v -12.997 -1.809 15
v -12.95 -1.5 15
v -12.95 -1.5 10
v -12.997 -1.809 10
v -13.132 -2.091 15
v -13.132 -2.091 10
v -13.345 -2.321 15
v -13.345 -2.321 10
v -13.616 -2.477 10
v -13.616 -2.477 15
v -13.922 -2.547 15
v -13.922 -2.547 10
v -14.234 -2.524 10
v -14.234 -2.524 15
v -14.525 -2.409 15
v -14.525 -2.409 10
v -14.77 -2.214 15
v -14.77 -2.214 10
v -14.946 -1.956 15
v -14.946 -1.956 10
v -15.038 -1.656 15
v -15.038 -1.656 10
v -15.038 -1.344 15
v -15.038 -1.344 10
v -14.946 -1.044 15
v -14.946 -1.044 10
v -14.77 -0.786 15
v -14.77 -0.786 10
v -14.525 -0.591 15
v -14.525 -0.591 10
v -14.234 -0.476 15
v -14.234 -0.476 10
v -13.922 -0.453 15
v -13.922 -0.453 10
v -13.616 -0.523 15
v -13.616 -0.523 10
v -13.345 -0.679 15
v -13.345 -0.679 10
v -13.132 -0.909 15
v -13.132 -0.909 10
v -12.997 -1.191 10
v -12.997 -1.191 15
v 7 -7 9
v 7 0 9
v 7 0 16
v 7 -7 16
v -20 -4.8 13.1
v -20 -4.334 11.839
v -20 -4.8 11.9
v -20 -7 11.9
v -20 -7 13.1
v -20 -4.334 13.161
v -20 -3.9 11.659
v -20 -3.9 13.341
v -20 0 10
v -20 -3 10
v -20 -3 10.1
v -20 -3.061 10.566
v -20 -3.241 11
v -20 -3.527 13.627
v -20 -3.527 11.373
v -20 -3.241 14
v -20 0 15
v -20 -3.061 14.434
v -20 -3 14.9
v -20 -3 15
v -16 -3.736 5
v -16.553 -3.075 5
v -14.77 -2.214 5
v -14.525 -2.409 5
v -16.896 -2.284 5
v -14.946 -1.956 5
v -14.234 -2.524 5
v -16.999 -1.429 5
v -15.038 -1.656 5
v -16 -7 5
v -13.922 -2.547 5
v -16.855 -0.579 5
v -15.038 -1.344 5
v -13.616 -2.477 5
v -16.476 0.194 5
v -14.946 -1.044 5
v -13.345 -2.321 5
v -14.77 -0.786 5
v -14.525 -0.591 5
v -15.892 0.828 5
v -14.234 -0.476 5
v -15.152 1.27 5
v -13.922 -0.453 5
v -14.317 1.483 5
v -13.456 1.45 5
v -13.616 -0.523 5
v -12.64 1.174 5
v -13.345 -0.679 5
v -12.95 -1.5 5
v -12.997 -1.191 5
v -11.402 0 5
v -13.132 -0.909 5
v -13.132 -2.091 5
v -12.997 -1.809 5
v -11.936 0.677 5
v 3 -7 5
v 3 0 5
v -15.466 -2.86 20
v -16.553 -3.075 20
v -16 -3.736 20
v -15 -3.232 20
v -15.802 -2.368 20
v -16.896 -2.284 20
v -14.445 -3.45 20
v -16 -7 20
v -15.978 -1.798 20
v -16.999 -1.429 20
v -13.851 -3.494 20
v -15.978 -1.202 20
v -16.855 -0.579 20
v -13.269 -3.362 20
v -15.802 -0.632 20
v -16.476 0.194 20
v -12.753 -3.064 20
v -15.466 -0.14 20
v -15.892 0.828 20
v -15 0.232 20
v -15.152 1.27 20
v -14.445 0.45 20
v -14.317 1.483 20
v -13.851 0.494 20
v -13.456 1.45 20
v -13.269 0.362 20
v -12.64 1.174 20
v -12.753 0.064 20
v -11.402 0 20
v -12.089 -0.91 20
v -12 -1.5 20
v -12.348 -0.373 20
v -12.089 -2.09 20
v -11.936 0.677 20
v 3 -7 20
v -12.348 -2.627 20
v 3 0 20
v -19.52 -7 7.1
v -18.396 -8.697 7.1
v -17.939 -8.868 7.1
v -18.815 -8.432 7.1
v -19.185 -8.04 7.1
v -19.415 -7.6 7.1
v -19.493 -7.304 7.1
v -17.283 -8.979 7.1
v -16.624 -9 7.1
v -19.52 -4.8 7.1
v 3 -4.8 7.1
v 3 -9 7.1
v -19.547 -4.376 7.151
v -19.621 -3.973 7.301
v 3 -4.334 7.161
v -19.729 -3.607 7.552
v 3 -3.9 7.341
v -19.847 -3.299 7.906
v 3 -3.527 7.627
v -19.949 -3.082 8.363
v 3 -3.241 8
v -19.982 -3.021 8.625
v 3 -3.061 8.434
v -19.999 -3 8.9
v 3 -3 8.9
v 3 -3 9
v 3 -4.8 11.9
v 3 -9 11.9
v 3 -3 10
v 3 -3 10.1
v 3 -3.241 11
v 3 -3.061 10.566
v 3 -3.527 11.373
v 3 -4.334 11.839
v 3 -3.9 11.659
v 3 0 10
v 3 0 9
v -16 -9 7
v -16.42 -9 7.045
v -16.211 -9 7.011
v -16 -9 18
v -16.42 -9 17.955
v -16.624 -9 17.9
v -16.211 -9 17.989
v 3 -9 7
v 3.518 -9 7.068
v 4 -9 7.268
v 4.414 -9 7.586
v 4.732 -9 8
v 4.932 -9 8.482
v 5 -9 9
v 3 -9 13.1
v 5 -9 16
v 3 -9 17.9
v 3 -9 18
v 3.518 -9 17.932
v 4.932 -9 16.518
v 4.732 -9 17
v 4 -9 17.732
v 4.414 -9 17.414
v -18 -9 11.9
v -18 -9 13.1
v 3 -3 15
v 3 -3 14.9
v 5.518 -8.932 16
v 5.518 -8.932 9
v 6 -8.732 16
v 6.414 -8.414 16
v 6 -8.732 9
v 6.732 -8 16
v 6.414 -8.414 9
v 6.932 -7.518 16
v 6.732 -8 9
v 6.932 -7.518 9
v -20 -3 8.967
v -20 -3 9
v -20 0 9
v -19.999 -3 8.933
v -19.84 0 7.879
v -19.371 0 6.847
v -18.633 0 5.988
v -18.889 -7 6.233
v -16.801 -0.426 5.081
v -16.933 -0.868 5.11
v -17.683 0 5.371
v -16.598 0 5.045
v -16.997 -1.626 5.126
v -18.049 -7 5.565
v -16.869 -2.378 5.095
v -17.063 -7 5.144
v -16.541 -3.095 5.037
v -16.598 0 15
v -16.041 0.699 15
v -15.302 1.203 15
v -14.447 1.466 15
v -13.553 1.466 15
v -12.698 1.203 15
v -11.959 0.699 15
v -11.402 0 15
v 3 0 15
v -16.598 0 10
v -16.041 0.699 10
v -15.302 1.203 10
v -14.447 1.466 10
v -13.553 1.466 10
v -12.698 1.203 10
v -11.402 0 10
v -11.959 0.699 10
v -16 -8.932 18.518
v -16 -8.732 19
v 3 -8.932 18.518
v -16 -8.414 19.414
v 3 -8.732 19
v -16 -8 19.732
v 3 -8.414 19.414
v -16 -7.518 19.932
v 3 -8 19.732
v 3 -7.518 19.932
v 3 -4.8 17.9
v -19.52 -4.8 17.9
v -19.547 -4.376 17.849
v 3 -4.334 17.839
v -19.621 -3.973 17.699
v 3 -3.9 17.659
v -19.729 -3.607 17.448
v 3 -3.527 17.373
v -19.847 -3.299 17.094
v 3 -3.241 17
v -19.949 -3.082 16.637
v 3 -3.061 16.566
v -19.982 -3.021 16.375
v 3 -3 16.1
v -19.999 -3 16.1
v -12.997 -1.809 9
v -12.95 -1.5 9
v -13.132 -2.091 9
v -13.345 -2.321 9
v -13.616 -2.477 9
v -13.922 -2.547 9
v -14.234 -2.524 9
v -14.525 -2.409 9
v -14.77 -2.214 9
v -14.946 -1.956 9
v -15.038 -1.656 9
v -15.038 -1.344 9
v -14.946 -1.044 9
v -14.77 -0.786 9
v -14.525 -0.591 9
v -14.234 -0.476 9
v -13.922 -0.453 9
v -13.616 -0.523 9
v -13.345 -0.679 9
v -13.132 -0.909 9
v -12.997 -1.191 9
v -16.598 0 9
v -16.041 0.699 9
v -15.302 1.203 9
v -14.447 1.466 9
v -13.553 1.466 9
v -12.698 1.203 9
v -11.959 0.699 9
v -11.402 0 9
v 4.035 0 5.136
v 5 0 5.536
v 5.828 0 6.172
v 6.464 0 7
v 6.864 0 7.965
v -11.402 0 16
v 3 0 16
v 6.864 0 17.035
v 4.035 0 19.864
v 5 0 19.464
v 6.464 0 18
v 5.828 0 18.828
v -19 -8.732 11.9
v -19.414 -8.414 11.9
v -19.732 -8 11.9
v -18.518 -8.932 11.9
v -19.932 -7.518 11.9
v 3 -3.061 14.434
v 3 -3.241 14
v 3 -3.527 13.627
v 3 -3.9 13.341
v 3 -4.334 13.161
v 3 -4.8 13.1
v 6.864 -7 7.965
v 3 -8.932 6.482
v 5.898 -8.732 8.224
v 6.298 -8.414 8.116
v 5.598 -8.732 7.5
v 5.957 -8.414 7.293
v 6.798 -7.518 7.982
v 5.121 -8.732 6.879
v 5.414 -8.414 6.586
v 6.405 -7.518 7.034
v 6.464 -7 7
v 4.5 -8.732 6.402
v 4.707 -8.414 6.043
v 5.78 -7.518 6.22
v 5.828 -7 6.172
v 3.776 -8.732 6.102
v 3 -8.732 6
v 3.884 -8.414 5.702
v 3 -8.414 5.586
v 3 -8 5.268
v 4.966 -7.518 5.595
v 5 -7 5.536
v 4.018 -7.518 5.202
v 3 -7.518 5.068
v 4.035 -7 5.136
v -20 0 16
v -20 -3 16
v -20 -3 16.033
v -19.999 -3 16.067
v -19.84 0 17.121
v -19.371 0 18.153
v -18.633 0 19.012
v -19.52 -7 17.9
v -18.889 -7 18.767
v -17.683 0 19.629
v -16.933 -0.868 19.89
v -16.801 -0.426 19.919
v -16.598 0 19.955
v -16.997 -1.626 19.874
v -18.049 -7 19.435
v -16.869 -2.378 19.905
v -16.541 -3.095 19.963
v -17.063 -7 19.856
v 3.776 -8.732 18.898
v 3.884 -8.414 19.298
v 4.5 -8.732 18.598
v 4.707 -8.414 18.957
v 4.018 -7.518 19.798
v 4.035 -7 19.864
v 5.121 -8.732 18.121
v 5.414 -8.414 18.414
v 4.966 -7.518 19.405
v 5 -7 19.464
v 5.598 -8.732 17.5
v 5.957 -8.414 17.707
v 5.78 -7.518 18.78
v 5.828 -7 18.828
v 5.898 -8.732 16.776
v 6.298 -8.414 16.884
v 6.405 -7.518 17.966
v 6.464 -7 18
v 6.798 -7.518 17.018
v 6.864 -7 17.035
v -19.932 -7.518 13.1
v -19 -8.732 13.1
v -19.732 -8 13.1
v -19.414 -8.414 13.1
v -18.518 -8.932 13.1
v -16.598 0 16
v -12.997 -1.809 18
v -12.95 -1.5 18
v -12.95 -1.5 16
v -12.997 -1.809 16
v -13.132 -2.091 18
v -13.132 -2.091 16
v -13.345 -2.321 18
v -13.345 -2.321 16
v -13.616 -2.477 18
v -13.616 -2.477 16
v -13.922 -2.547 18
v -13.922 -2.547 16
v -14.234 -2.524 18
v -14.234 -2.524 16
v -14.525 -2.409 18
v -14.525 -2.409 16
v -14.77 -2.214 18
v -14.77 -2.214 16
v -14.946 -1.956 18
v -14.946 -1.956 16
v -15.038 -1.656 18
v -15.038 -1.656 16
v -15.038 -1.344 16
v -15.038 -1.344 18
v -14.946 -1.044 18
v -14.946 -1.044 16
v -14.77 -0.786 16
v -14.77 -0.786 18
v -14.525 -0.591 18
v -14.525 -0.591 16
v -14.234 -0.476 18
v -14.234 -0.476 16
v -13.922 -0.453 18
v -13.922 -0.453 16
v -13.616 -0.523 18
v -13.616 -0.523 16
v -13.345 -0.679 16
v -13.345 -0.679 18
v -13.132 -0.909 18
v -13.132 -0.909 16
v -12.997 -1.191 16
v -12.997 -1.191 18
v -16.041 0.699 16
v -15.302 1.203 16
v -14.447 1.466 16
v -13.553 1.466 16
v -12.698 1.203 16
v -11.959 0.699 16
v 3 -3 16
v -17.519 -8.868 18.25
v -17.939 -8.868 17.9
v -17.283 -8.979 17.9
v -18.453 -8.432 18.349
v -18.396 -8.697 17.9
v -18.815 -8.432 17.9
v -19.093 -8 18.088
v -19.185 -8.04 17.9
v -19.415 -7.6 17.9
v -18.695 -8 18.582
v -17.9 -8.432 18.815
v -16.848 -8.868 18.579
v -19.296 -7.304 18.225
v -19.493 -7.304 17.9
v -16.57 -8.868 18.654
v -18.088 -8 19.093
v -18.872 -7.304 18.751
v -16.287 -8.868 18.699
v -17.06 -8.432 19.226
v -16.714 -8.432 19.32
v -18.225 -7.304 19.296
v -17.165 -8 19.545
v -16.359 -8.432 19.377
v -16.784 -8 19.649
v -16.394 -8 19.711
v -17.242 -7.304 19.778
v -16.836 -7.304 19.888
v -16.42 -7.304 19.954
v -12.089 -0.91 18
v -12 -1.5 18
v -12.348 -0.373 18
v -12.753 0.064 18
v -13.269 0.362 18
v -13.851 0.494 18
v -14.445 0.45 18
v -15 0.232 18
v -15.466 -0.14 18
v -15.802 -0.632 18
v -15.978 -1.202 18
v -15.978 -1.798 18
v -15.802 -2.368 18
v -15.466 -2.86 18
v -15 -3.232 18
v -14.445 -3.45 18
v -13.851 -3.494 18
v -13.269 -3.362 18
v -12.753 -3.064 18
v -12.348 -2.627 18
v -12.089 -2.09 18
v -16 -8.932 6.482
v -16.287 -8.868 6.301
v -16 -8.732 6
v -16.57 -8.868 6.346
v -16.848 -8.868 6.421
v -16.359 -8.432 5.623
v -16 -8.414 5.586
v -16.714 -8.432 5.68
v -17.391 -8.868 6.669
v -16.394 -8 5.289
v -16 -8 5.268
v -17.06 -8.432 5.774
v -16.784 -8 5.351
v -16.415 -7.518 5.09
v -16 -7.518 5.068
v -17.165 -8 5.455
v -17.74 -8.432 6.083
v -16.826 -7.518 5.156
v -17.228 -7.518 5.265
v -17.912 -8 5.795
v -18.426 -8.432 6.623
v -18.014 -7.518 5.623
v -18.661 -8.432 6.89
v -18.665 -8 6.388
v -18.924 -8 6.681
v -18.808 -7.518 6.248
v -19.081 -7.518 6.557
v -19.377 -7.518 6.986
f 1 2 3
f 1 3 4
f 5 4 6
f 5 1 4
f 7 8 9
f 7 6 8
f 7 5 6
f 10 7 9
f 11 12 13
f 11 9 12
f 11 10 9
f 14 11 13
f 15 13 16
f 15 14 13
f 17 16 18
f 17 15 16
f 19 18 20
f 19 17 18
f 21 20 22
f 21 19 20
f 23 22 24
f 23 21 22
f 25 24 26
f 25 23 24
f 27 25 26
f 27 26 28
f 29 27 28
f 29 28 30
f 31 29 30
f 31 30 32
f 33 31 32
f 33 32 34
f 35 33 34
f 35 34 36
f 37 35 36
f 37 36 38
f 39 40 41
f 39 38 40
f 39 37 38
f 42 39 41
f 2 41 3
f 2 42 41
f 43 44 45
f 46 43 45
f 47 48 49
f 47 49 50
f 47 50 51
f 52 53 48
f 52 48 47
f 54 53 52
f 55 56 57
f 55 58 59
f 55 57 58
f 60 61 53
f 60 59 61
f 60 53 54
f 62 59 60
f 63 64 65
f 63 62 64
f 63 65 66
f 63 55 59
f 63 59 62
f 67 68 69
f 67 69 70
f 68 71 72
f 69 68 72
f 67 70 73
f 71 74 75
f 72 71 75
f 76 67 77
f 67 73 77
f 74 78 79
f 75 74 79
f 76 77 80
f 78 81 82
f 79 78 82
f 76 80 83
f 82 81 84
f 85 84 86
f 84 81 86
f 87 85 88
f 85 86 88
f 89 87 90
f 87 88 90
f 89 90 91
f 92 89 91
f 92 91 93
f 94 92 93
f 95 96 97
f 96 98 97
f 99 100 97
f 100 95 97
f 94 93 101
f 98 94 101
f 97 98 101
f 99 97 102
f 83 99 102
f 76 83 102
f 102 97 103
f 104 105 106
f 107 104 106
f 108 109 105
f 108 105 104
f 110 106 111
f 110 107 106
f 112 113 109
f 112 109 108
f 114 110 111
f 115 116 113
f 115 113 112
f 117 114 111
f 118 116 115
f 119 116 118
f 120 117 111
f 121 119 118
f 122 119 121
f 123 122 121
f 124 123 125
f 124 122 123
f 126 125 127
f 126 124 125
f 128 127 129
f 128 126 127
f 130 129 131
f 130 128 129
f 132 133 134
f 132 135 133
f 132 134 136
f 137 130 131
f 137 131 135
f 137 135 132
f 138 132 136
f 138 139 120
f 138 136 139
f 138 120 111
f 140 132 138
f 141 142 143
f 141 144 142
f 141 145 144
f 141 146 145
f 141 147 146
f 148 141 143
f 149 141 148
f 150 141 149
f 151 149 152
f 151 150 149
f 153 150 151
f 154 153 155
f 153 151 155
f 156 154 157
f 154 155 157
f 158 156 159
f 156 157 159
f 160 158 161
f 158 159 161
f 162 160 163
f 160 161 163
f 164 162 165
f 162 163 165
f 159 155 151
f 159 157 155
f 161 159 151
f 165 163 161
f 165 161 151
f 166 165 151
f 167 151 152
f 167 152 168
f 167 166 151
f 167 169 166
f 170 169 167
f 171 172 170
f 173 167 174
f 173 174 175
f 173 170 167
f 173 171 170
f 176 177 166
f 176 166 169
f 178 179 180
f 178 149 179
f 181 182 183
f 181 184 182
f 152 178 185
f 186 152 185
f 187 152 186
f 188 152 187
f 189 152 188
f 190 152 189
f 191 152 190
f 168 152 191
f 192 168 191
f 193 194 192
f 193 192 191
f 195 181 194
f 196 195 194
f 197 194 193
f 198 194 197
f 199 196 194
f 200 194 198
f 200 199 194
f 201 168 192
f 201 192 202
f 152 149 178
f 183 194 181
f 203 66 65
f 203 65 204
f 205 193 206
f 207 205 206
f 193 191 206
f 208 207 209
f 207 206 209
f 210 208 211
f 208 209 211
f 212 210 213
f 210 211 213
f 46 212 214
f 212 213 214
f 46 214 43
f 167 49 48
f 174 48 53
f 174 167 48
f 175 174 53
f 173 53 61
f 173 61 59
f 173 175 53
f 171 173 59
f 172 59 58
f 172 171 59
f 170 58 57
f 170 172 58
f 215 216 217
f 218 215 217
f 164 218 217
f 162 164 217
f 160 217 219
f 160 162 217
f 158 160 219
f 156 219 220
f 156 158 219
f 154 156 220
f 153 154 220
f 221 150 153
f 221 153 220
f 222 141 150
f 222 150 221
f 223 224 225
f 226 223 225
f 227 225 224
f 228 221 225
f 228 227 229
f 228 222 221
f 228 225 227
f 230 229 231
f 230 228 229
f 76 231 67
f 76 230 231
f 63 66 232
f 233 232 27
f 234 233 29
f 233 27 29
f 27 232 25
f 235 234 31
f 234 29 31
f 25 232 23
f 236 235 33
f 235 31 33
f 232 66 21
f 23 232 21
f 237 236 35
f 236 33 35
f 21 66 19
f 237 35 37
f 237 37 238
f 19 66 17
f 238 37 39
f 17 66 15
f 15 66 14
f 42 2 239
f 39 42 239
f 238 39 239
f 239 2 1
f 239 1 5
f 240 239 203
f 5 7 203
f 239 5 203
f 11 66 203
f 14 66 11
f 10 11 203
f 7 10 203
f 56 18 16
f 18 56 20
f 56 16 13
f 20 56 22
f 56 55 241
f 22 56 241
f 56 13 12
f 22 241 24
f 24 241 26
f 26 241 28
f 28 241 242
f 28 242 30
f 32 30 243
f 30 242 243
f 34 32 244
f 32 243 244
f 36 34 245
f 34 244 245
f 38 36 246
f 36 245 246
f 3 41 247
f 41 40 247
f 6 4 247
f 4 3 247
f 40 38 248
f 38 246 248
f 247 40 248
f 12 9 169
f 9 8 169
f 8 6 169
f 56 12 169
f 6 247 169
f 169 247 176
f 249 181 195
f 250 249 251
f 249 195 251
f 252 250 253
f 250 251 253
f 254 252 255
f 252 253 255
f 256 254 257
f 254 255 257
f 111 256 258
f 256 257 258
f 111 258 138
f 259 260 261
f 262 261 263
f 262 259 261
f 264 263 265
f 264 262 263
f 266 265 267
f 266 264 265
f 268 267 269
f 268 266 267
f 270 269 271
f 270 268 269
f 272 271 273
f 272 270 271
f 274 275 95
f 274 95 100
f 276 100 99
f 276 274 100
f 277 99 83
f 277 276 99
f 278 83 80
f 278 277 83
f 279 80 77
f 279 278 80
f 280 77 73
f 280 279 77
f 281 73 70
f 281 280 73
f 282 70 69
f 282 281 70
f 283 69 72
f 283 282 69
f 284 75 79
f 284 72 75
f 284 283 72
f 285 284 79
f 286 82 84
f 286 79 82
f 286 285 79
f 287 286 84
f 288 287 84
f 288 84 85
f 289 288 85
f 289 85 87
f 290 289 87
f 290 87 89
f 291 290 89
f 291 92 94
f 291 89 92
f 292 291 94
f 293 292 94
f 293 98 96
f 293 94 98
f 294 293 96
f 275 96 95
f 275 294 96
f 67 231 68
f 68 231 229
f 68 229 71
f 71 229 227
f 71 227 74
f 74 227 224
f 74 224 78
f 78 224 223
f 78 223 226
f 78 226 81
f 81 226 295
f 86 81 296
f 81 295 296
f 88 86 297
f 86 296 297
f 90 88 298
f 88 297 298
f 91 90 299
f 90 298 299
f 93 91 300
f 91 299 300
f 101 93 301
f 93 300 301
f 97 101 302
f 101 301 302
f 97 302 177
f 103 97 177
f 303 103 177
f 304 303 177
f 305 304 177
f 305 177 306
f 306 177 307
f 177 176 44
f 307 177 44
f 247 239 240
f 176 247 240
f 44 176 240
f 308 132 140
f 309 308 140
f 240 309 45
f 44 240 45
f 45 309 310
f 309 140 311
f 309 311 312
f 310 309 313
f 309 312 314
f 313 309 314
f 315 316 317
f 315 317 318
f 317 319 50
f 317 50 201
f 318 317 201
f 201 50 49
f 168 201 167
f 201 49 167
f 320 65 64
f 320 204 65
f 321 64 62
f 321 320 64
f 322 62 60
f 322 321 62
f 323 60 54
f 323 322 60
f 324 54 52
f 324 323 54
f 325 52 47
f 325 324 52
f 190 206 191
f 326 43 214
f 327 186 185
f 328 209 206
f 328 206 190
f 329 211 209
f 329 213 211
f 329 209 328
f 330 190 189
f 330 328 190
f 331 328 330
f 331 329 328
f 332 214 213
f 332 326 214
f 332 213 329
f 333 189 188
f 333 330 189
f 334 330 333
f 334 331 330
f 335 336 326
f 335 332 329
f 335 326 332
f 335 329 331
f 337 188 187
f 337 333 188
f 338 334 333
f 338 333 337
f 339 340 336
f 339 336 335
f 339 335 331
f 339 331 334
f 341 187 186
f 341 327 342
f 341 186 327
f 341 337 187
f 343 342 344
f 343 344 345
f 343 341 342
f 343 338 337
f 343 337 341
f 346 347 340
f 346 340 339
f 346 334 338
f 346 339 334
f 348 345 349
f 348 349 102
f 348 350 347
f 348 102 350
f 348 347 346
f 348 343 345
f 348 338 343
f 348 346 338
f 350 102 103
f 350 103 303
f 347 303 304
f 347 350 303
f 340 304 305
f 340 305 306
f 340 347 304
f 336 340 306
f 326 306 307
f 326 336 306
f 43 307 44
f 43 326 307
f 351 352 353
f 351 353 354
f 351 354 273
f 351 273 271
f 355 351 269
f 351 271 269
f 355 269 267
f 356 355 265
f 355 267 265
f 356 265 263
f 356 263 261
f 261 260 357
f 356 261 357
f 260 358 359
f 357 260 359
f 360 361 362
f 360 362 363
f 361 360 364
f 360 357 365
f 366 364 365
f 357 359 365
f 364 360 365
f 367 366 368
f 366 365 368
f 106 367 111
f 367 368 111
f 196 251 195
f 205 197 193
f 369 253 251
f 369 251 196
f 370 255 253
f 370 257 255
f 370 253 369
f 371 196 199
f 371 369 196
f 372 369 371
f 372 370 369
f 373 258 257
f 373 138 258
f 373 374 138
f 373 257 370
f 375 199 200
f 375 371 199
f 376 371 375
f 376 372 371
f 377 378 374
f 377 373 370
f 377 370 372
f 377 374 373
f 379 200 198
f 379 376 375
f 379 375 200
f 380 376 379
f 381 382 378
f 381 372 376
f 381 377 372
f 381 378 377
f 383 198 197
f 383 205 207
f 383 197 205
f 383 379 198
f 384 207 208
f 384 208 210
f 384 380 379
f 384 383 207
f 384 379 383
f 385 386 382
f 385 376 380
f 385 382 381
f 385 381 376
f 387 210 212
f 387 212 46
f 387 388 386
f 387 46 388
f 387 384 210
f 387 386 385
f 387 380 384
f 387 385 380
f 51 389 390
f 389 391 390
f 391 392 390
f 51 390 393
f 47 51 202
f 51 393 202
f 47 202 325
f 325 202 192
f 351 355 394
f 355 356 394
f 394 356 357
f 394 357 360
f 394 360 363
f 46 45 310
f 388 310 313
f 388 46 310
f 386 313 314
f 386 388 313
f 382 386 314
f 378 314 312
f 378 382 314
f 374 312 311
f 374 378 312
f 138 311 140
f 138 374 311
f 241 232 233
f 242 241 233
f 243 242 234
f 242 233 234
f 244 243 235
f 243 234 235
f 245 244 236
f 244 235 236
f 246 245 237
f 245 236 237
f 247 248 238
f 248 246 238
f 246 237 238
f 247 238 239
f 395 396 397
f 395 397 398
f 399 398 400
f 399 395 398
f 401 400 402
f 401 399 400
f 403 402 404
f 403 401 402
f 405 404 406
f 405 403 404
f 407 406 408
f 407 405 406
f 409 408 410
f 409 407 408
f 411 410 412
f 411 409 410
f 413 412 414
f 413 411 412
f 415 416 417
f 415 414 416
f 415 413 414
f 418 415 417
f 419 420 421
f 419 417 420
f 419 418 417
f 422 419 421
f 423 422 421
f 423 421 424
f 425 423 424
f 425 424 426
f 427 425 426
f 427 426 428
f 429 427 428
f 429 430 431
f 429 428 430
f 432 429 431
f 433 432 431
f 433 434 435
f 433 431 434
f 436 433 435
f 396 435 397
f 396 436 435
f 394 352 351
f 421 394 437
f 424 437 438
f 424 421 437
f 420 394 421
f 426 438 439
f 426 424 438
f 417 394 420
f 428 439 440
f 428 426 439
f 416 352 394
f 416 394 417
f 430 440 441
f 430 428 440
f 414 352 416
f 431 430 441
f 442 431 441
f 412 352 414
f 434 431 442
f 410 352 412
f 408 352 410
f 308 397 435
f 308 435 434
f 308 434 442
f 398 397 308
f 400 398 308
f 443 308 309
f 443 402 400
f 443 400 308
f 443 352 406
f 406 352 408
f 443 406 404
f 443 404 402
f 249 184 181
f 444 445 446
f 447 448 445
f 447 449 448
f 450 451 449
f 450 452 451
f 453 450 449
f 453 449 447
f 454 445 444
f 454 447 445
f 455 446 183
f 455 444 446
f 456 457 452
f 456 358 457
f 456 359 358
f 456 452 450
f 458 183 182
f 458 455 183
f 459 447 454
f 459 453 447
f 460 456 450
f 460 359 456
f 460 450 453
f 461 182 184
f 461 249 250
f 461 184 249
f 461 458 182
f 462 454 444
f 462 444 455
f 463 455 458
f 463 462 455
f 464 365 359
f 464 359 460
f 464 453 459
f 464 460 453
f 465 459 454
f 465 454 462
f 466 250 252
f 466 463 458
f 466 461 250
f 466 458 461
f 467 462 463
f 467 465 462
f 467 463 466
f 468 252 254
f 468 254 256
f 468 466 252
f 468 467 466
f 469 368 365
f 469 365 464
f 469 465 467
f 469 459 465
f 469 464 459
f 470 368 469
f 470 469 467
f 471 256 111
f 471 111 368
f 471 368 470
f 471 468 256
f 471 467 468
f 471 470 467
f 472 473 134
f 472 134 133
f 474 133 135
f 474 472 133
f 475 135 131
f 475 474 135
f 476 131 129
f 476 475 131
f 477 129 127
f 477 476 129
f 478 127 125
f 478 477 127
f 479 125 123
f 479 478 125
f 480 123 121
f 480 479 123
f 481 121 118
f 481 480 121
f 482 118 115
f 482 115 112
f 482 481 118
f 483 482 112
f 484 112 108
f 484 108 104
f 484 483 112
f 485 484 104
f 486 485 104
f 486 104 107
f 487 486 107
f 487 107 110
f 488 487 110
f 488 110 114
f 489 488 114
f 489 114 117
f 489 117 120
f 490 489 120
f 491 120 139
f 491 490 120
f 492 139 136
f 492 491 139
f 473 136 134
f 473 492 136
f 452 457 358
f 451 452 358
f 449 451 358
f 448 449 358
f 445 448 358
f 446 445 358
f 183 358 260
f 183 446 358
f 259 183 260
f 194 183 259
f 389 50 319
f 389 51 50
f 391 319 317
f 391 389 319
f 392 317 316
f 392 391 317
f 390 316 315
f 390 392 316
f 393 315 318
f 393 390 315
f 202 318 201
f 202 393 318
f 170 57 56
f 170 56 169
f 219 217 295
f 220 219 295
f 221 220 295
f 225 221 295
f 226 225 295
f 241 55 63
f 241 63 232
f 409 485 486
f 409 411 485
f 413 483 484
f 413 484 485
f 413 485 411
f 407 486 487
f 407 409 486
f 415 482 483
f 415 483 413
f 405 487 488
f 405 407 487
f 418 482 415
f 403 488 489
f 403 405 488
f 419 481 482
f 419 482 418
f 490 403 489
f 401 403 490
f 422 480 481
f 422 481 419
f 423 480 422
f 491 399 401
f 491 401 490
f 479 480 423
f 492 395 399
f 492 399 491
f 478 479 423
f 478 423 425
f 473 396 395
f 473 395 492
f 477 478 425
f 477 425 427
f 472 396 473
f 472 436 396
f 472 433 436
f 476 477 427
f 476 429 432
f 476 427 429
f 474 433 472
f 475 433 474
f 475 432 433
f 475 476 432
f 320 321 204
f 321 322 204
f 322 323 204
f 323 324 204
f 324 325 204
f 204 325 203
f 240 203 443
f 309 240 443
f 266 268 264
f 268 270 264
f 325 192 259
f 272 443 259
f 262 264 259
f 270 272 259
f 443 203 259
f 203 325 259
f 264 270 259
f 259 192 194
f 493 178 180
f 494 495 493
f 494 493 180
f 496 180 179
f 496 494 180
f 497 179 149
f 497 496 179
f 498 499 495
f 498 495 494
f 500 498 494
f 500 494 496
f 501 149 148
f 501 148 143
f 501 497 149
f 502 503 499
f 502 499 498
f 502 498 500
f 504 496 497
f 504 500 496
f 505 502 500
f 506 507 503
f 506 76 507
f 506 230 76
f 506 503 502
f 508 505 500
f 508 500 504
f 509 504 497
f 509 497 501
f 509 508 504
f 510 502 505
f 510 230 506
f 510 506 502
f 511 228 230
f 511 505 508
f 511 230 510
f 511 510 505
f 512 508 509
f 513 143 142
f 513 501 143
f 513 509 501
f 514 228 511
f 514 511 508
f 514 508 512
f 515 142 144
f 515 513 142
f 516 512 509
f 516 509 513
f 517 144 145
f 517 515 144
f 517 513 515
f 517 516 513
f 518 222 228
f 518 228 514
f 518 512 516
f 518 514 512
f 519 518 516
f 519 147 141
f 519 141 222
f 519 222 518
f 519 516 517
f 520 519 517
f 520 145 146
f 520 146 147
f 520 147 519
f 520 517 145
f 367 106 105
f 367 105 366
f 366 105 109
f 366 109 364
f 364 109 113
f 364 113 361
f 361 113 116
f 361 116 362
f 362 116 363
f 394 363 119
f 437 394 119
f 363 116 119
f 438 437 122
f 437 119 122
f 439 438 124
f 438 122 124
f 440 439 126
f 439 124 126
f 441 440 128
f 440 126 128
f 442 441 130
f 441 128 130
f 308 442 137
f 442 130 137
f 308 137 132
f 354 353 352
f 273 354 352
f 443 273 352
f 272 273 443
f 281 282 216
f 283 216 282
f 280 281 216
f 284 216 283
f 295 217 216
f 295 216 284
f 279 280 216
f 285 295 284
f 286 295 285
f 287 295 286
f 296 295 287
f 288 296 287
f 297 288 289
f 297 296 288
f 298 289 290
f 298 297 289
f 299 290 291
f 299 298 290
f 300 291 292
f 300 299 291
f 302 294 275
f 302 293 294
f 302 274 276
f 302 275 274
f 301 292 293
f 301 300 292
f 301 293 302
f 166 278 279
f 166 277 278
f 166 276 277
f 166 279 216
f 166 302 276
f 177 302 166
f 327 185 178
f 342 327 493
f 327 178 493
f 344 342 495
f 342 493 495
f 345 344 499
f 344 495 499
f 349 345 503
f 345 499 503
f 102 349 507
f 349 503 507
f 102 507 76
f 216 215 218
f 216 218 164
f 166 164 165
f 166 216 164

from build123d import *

# Parameters (mm, degrees)
CYLINDER002_R          = 2
CYLINDER002_DEPTH      = 2
CYLINDER_R             = 1.05
CYLINDER_DEPTH         = 20
CYLINDER_ROLL_ANGLE    = 90
RECTANGLE004_W         = 26
RECTANGLE004_H         = 4.8
EXTRUDE005_DEPTH       = 8
RECTANGLE002_W         = 26
RECTANGLE002_H         = 1
EXTRUDE004_DEPTH       = 20
RECTANGLE005_W         = 26
RECTANGLE005_H         = 4.8
EXTRUDE008_DEPTH       = 8
RECTANGLE001_W         = 26
RECTANGLE001_H         = 1
EXTRUDE002_DEPTH       = 20
RECTANGLE_W            = 27
RECTANGLE_H            = 15
EXTRUDE_DEPTH          = 9
FILLET_R               = 4
FILLET001_R            = 1.8
RECTANGLE008_W         = 26
RECTANGLE008_H         = 4.8
EXTRUDE011_DEPTH       = 8
RECTANGLE007_W         = 26
RECTANGLE007_H         = 1
EXTRUDE010_DEPTH       = 20
RECTANGLE009_W         = 26
RECTANGLE009_H         = 4.8
EXTRUDE012_DEPTH       = 8
RECTANGLE006_W         = 26
RECTANGLE006_H         = 1
EXTRUDE009_DEPTH       = 20
CYLINDER001_R          = 3
CYLINDER001_DEPTH      = 15
CYLINDER001_ROLL_ANGLE = 90
CUT002_ROLL_ANGLE      = 90
FILLET002_R            = 2


with BuildPart() as cylinder002:
    # Cylinder002 → Cylinder002 (new body)
    with BuildSketch(Plane(origin=(-14, -1.5, 18), x_dir=(1, 0, 0), z_dir=(0, 0, 1))):
        Circle(CYLINDER002_R)
    extrude(amount=CYLINDER002_DEPTH)


with BuildPart() as cylinder:
    # Cylinder → Cylinder (new body)
    with BuildSketch(Plane.XY):
        Circle(CYLINDER_R)
    extrude(amount=CYLINDER_DEPTH)


with BuildPart() as cylinder_1:
    # Cylinder roll: moved
    add(cylinder.part.rotate(Axis((0, 0, 0), (1, 0, 0)), CYLINDER_ROLL_ANGLE))


with BuildPart() as cylinder_2:
    # Cylinder placement: moved
    add(cylinder_1.part.moved(Location((-14, 21, 1.5))))


with BuildPart() as extrude005:
    # Rectangle004 → Extrude005 (new body)
    with BuildSketch(Plane(origin=(-23, 13.1, 0), x_dir=(1, 0, 0), z_dir=(0, 0, 1))):
        with Locations((13, 2.4)):
            Rectangle(RECTANGLE004_W, RECTANGLE004_H)
    extrude(amount=-EXTRUDE005_DEPTH)


with BuildPart() as extrude005_1:
    # Extrude005 placement: moved
    add(extrude005.part.moved(Location((0, 0, 11))))


with BuildPart() as extrude004:
    # Rectangle002 → Extrude004 (new body)
    with BuildSketch(Plane(origin=(-23, 10, 0), x_dir=(1, 0, 0), z_dir=(0, 0, 1))):
        with Locations((13, -0.5)):
            Rectangle(RECTANGLE002_W, RECTANGLE002_H)
    extrude(amount=EXTRUDE004_DEPTH)


with BuildPart() as extrude004_1:
    # Extrude004 placement: moved
    add(extrude004.part.moved(Location((0, 0, -4))))


with BuildPart() as extrude008:
    # Rectangle005 → Extrude008 (new body)
    with BuildSketch(Plane(origin=(-23, 11.9, 0), x_dir=(1, 0, 0), z_dir=(0, 0, 1))):
        with Locations((13, -2.4)):
            Rectangle(RECTANGLE005_W, RECTANGLE005_H)
    extrude(amount=EXTRUDE008_DEPTH)


with BuildPart() as extrude008_1:
    # Extrude008 placement: moved
    add(extrude008.part.moved(Location((0, 0, 3))))


with BuildPart() as fusion:
    # Rectangle001 → Extrude002 (new body)
    with BuildSketch(Plane(origin=(-23, 16, 0), x_dir=(1, 0, 0), z_dir=(0, 0, 1))):
        with Locations((13, 0.5)):
            Rectangle(RECTANGLE001_W, RECTANGLE001_H)
    extrude(amount=-EXTRUDE002_DEPTH)


with BuildPart() as fusion_1:
    # Extrude002 placement: moved
    add(fusion.part.moved(Location((0, -1, 10))))

    # Fusion: union Extrude005, Extrude004, Extrude008
    add(extrude005_1.part)
    add(extrude004_1.part)
    add(extrude008_1.part)


with BuildPart() as fillet001:
    # Rectangle → Extrude (new body)
    with BuildSketch(Plane(origin=(-20, 20, 0), x_dir=(1, 0, 0), z_dir=(0, 0, 1))):
        with Locations((13.5, -7.5)):
            Rectangle(RECTANGLE_W, RECTANGLE_H)
    extrude(amount=EXTRUDE_DEPTH)

    # Fillet
    fillet_edges = [fillet001.edges().sort_by_distance(p)[0] for p in [
        (-20, 20, 4.5),
        (7, 20, 4.5),
        (7, 5, 4.5),
        (-20, 5, 4.5),
    ]]
    fillet(fillet_edges, radius=FILLET_R)

    # Cut: cut Fusion
    add(fusion_1.part, mode=Mode.SUBTRACT)

    # Fillet001
    fillet001_edges = [fillet001.edges().sort_by_distance(p)[0] for p in [
        (-8.259972, 17.9, 3),
        (-8.259972, 7.1, 3),
        (-8.5, 11.9, 3),
        (-8.5, 13.1, 3),
    ]]
    fillet(fillet001_edges, radius=FILLET001_R)


with BuildPart() as extrude011:
    # Rectangle008 → Extrude011 (new body)
    with BuildSketch(Plane(origin=(-23, 13.1, 0), x_dir=(1, 0, 0), z_dir=(0, 0, 1))):
        with Locations((13, 2.4)):
            Rectangle(RECTANGLE008_W, RECTANGLE008_H)
    extrude(amount=-EXTRUDE011_DEPTH)


with BuildPart() as extrude011_1:
    # Extrude011 placement: moved
    add(extrude011.part.moved(Location((0, 0, 11))))


with BuildPart() as extrude010:
    # Rectangle007 → Extrude010 (new body)
    with BuildSketch(Plane(origin=(-23, 10, 0), x_dir=(1, 0, 0), z_dir=(0, 0, 1))):
        with Locations((13, -0.5)):
            Rectangle(RECTANGLE007_W, RECTANGLE007_H)
    extrude(amount=EXTRUDE010_DEPTH)


with BuildPart() as extrude010_1:
    # Extrude010 placement: moved
    add(extrude010.part.moved(Location((0, 0, -4))))


with BuildPart() as extrude012:
    # Rectangle009 → Extrude012 (new body)
    with BuildSketch(Plane(origin=(-23, 11.9, 0), x_dir=(1, 0, 0), z_dir=(0, 0, 1))):
        with Locations((13, -2.4)):
            Rectangle(RECTANGLE009_W, RECTANGLE009_H)
    extrude(amount=EXTRUDE012_DEPTH)


with BuildPart() as extrude012_1:
    # Extrude012 placement: moved
    add(extrude012.part.moved(Location((0, 0, 3))))


with BuildPart() as fusion001:
    # Rectangle006 → Extrude009 (new body)
    with BuildSketch(Plane(origin=(-23, 16, 0), x_dir=(1, 0, 0), z_dir=(0, 0, 1))):
        with Locations((13, 0.5)):
            Rectangle(RECTANGLE006_W, RECTANGLE006_H)
    extrude(amount=-EXTRUDE009_DEPTH)


with BuildPart() as fusion001_1:
    # Extrude009 placement: moved
    add(fusion001.part.moved(Location((0, -1, 10))))

    # Fusion001: union Extrude011, Extrude010, Extrude012
    add(extrude011_1.part)
    add(extrude010_1.part)
    add(extrude012_1.part)


with BuildPart() as fillet002:
    # Cylinder001 → Cylinder001 (new body)
    with BuildSketch(Plane.XY):
        Circle(CYLINDER001_R)
    extrude(amount=CYLINDER001_DEPTH)


with BuildPart() as fillet002_1:
    # Cylinder001 roll: moved
    add(fillet002.part.rotate(Axis((0, 0, 0), (1, 0, 0)), CYLINDER001_ROLL_ANGLE))


with BuildPart() as fillet002_2:
    # Cylinder001 placement: moved
    add(fillet002_1.part.moved(Location((-14, 20, 1.5))))

    # Cut001: cut Fusion001
    add(fusion001_1.part, mode=Mode.SUBTRACT)

    # Fusion002: union Fillet001
    add(fillet001.part)

    # Cut002: cut Cylinder
    add(cylinder_2.part, mode=Mode.SUBTRACT)


with BuildPart() as fillet002_3:
    # Cut002 roll: moved
    add(fillet002_2.part.rotate(Axis((0, 0, 0), (1, 0, 0)), CUT002_ROLL_ANGLE))


with BuildPart() as fillet002_4:
    # Cut002 placement: moved
    add(fillet002_3.part)

    # Cut003: cut Cylinder002
    add(cylinder002.part, mode=Mode.SUBTRACT)

    # Fillet002
    fillet002_edges = [fillet002_4.edges().sort_by_distance(p)[0] for p in [
        (-6.5, -9, 20),
        (5.828427, -9, 18.828427),
        (7, -9, 12.5),
        (5.828427, -9, 6.171573),
        (-6.5, -9, 5),
        (-18.04939, -9, 5.564887),
        (-20, -9, 12.5),
        (-18.04939, -9, 19.435113),
    ]]
    fillet(fillet002_edges, radius=FILLET002_R)


solid = fillet002_4.part
